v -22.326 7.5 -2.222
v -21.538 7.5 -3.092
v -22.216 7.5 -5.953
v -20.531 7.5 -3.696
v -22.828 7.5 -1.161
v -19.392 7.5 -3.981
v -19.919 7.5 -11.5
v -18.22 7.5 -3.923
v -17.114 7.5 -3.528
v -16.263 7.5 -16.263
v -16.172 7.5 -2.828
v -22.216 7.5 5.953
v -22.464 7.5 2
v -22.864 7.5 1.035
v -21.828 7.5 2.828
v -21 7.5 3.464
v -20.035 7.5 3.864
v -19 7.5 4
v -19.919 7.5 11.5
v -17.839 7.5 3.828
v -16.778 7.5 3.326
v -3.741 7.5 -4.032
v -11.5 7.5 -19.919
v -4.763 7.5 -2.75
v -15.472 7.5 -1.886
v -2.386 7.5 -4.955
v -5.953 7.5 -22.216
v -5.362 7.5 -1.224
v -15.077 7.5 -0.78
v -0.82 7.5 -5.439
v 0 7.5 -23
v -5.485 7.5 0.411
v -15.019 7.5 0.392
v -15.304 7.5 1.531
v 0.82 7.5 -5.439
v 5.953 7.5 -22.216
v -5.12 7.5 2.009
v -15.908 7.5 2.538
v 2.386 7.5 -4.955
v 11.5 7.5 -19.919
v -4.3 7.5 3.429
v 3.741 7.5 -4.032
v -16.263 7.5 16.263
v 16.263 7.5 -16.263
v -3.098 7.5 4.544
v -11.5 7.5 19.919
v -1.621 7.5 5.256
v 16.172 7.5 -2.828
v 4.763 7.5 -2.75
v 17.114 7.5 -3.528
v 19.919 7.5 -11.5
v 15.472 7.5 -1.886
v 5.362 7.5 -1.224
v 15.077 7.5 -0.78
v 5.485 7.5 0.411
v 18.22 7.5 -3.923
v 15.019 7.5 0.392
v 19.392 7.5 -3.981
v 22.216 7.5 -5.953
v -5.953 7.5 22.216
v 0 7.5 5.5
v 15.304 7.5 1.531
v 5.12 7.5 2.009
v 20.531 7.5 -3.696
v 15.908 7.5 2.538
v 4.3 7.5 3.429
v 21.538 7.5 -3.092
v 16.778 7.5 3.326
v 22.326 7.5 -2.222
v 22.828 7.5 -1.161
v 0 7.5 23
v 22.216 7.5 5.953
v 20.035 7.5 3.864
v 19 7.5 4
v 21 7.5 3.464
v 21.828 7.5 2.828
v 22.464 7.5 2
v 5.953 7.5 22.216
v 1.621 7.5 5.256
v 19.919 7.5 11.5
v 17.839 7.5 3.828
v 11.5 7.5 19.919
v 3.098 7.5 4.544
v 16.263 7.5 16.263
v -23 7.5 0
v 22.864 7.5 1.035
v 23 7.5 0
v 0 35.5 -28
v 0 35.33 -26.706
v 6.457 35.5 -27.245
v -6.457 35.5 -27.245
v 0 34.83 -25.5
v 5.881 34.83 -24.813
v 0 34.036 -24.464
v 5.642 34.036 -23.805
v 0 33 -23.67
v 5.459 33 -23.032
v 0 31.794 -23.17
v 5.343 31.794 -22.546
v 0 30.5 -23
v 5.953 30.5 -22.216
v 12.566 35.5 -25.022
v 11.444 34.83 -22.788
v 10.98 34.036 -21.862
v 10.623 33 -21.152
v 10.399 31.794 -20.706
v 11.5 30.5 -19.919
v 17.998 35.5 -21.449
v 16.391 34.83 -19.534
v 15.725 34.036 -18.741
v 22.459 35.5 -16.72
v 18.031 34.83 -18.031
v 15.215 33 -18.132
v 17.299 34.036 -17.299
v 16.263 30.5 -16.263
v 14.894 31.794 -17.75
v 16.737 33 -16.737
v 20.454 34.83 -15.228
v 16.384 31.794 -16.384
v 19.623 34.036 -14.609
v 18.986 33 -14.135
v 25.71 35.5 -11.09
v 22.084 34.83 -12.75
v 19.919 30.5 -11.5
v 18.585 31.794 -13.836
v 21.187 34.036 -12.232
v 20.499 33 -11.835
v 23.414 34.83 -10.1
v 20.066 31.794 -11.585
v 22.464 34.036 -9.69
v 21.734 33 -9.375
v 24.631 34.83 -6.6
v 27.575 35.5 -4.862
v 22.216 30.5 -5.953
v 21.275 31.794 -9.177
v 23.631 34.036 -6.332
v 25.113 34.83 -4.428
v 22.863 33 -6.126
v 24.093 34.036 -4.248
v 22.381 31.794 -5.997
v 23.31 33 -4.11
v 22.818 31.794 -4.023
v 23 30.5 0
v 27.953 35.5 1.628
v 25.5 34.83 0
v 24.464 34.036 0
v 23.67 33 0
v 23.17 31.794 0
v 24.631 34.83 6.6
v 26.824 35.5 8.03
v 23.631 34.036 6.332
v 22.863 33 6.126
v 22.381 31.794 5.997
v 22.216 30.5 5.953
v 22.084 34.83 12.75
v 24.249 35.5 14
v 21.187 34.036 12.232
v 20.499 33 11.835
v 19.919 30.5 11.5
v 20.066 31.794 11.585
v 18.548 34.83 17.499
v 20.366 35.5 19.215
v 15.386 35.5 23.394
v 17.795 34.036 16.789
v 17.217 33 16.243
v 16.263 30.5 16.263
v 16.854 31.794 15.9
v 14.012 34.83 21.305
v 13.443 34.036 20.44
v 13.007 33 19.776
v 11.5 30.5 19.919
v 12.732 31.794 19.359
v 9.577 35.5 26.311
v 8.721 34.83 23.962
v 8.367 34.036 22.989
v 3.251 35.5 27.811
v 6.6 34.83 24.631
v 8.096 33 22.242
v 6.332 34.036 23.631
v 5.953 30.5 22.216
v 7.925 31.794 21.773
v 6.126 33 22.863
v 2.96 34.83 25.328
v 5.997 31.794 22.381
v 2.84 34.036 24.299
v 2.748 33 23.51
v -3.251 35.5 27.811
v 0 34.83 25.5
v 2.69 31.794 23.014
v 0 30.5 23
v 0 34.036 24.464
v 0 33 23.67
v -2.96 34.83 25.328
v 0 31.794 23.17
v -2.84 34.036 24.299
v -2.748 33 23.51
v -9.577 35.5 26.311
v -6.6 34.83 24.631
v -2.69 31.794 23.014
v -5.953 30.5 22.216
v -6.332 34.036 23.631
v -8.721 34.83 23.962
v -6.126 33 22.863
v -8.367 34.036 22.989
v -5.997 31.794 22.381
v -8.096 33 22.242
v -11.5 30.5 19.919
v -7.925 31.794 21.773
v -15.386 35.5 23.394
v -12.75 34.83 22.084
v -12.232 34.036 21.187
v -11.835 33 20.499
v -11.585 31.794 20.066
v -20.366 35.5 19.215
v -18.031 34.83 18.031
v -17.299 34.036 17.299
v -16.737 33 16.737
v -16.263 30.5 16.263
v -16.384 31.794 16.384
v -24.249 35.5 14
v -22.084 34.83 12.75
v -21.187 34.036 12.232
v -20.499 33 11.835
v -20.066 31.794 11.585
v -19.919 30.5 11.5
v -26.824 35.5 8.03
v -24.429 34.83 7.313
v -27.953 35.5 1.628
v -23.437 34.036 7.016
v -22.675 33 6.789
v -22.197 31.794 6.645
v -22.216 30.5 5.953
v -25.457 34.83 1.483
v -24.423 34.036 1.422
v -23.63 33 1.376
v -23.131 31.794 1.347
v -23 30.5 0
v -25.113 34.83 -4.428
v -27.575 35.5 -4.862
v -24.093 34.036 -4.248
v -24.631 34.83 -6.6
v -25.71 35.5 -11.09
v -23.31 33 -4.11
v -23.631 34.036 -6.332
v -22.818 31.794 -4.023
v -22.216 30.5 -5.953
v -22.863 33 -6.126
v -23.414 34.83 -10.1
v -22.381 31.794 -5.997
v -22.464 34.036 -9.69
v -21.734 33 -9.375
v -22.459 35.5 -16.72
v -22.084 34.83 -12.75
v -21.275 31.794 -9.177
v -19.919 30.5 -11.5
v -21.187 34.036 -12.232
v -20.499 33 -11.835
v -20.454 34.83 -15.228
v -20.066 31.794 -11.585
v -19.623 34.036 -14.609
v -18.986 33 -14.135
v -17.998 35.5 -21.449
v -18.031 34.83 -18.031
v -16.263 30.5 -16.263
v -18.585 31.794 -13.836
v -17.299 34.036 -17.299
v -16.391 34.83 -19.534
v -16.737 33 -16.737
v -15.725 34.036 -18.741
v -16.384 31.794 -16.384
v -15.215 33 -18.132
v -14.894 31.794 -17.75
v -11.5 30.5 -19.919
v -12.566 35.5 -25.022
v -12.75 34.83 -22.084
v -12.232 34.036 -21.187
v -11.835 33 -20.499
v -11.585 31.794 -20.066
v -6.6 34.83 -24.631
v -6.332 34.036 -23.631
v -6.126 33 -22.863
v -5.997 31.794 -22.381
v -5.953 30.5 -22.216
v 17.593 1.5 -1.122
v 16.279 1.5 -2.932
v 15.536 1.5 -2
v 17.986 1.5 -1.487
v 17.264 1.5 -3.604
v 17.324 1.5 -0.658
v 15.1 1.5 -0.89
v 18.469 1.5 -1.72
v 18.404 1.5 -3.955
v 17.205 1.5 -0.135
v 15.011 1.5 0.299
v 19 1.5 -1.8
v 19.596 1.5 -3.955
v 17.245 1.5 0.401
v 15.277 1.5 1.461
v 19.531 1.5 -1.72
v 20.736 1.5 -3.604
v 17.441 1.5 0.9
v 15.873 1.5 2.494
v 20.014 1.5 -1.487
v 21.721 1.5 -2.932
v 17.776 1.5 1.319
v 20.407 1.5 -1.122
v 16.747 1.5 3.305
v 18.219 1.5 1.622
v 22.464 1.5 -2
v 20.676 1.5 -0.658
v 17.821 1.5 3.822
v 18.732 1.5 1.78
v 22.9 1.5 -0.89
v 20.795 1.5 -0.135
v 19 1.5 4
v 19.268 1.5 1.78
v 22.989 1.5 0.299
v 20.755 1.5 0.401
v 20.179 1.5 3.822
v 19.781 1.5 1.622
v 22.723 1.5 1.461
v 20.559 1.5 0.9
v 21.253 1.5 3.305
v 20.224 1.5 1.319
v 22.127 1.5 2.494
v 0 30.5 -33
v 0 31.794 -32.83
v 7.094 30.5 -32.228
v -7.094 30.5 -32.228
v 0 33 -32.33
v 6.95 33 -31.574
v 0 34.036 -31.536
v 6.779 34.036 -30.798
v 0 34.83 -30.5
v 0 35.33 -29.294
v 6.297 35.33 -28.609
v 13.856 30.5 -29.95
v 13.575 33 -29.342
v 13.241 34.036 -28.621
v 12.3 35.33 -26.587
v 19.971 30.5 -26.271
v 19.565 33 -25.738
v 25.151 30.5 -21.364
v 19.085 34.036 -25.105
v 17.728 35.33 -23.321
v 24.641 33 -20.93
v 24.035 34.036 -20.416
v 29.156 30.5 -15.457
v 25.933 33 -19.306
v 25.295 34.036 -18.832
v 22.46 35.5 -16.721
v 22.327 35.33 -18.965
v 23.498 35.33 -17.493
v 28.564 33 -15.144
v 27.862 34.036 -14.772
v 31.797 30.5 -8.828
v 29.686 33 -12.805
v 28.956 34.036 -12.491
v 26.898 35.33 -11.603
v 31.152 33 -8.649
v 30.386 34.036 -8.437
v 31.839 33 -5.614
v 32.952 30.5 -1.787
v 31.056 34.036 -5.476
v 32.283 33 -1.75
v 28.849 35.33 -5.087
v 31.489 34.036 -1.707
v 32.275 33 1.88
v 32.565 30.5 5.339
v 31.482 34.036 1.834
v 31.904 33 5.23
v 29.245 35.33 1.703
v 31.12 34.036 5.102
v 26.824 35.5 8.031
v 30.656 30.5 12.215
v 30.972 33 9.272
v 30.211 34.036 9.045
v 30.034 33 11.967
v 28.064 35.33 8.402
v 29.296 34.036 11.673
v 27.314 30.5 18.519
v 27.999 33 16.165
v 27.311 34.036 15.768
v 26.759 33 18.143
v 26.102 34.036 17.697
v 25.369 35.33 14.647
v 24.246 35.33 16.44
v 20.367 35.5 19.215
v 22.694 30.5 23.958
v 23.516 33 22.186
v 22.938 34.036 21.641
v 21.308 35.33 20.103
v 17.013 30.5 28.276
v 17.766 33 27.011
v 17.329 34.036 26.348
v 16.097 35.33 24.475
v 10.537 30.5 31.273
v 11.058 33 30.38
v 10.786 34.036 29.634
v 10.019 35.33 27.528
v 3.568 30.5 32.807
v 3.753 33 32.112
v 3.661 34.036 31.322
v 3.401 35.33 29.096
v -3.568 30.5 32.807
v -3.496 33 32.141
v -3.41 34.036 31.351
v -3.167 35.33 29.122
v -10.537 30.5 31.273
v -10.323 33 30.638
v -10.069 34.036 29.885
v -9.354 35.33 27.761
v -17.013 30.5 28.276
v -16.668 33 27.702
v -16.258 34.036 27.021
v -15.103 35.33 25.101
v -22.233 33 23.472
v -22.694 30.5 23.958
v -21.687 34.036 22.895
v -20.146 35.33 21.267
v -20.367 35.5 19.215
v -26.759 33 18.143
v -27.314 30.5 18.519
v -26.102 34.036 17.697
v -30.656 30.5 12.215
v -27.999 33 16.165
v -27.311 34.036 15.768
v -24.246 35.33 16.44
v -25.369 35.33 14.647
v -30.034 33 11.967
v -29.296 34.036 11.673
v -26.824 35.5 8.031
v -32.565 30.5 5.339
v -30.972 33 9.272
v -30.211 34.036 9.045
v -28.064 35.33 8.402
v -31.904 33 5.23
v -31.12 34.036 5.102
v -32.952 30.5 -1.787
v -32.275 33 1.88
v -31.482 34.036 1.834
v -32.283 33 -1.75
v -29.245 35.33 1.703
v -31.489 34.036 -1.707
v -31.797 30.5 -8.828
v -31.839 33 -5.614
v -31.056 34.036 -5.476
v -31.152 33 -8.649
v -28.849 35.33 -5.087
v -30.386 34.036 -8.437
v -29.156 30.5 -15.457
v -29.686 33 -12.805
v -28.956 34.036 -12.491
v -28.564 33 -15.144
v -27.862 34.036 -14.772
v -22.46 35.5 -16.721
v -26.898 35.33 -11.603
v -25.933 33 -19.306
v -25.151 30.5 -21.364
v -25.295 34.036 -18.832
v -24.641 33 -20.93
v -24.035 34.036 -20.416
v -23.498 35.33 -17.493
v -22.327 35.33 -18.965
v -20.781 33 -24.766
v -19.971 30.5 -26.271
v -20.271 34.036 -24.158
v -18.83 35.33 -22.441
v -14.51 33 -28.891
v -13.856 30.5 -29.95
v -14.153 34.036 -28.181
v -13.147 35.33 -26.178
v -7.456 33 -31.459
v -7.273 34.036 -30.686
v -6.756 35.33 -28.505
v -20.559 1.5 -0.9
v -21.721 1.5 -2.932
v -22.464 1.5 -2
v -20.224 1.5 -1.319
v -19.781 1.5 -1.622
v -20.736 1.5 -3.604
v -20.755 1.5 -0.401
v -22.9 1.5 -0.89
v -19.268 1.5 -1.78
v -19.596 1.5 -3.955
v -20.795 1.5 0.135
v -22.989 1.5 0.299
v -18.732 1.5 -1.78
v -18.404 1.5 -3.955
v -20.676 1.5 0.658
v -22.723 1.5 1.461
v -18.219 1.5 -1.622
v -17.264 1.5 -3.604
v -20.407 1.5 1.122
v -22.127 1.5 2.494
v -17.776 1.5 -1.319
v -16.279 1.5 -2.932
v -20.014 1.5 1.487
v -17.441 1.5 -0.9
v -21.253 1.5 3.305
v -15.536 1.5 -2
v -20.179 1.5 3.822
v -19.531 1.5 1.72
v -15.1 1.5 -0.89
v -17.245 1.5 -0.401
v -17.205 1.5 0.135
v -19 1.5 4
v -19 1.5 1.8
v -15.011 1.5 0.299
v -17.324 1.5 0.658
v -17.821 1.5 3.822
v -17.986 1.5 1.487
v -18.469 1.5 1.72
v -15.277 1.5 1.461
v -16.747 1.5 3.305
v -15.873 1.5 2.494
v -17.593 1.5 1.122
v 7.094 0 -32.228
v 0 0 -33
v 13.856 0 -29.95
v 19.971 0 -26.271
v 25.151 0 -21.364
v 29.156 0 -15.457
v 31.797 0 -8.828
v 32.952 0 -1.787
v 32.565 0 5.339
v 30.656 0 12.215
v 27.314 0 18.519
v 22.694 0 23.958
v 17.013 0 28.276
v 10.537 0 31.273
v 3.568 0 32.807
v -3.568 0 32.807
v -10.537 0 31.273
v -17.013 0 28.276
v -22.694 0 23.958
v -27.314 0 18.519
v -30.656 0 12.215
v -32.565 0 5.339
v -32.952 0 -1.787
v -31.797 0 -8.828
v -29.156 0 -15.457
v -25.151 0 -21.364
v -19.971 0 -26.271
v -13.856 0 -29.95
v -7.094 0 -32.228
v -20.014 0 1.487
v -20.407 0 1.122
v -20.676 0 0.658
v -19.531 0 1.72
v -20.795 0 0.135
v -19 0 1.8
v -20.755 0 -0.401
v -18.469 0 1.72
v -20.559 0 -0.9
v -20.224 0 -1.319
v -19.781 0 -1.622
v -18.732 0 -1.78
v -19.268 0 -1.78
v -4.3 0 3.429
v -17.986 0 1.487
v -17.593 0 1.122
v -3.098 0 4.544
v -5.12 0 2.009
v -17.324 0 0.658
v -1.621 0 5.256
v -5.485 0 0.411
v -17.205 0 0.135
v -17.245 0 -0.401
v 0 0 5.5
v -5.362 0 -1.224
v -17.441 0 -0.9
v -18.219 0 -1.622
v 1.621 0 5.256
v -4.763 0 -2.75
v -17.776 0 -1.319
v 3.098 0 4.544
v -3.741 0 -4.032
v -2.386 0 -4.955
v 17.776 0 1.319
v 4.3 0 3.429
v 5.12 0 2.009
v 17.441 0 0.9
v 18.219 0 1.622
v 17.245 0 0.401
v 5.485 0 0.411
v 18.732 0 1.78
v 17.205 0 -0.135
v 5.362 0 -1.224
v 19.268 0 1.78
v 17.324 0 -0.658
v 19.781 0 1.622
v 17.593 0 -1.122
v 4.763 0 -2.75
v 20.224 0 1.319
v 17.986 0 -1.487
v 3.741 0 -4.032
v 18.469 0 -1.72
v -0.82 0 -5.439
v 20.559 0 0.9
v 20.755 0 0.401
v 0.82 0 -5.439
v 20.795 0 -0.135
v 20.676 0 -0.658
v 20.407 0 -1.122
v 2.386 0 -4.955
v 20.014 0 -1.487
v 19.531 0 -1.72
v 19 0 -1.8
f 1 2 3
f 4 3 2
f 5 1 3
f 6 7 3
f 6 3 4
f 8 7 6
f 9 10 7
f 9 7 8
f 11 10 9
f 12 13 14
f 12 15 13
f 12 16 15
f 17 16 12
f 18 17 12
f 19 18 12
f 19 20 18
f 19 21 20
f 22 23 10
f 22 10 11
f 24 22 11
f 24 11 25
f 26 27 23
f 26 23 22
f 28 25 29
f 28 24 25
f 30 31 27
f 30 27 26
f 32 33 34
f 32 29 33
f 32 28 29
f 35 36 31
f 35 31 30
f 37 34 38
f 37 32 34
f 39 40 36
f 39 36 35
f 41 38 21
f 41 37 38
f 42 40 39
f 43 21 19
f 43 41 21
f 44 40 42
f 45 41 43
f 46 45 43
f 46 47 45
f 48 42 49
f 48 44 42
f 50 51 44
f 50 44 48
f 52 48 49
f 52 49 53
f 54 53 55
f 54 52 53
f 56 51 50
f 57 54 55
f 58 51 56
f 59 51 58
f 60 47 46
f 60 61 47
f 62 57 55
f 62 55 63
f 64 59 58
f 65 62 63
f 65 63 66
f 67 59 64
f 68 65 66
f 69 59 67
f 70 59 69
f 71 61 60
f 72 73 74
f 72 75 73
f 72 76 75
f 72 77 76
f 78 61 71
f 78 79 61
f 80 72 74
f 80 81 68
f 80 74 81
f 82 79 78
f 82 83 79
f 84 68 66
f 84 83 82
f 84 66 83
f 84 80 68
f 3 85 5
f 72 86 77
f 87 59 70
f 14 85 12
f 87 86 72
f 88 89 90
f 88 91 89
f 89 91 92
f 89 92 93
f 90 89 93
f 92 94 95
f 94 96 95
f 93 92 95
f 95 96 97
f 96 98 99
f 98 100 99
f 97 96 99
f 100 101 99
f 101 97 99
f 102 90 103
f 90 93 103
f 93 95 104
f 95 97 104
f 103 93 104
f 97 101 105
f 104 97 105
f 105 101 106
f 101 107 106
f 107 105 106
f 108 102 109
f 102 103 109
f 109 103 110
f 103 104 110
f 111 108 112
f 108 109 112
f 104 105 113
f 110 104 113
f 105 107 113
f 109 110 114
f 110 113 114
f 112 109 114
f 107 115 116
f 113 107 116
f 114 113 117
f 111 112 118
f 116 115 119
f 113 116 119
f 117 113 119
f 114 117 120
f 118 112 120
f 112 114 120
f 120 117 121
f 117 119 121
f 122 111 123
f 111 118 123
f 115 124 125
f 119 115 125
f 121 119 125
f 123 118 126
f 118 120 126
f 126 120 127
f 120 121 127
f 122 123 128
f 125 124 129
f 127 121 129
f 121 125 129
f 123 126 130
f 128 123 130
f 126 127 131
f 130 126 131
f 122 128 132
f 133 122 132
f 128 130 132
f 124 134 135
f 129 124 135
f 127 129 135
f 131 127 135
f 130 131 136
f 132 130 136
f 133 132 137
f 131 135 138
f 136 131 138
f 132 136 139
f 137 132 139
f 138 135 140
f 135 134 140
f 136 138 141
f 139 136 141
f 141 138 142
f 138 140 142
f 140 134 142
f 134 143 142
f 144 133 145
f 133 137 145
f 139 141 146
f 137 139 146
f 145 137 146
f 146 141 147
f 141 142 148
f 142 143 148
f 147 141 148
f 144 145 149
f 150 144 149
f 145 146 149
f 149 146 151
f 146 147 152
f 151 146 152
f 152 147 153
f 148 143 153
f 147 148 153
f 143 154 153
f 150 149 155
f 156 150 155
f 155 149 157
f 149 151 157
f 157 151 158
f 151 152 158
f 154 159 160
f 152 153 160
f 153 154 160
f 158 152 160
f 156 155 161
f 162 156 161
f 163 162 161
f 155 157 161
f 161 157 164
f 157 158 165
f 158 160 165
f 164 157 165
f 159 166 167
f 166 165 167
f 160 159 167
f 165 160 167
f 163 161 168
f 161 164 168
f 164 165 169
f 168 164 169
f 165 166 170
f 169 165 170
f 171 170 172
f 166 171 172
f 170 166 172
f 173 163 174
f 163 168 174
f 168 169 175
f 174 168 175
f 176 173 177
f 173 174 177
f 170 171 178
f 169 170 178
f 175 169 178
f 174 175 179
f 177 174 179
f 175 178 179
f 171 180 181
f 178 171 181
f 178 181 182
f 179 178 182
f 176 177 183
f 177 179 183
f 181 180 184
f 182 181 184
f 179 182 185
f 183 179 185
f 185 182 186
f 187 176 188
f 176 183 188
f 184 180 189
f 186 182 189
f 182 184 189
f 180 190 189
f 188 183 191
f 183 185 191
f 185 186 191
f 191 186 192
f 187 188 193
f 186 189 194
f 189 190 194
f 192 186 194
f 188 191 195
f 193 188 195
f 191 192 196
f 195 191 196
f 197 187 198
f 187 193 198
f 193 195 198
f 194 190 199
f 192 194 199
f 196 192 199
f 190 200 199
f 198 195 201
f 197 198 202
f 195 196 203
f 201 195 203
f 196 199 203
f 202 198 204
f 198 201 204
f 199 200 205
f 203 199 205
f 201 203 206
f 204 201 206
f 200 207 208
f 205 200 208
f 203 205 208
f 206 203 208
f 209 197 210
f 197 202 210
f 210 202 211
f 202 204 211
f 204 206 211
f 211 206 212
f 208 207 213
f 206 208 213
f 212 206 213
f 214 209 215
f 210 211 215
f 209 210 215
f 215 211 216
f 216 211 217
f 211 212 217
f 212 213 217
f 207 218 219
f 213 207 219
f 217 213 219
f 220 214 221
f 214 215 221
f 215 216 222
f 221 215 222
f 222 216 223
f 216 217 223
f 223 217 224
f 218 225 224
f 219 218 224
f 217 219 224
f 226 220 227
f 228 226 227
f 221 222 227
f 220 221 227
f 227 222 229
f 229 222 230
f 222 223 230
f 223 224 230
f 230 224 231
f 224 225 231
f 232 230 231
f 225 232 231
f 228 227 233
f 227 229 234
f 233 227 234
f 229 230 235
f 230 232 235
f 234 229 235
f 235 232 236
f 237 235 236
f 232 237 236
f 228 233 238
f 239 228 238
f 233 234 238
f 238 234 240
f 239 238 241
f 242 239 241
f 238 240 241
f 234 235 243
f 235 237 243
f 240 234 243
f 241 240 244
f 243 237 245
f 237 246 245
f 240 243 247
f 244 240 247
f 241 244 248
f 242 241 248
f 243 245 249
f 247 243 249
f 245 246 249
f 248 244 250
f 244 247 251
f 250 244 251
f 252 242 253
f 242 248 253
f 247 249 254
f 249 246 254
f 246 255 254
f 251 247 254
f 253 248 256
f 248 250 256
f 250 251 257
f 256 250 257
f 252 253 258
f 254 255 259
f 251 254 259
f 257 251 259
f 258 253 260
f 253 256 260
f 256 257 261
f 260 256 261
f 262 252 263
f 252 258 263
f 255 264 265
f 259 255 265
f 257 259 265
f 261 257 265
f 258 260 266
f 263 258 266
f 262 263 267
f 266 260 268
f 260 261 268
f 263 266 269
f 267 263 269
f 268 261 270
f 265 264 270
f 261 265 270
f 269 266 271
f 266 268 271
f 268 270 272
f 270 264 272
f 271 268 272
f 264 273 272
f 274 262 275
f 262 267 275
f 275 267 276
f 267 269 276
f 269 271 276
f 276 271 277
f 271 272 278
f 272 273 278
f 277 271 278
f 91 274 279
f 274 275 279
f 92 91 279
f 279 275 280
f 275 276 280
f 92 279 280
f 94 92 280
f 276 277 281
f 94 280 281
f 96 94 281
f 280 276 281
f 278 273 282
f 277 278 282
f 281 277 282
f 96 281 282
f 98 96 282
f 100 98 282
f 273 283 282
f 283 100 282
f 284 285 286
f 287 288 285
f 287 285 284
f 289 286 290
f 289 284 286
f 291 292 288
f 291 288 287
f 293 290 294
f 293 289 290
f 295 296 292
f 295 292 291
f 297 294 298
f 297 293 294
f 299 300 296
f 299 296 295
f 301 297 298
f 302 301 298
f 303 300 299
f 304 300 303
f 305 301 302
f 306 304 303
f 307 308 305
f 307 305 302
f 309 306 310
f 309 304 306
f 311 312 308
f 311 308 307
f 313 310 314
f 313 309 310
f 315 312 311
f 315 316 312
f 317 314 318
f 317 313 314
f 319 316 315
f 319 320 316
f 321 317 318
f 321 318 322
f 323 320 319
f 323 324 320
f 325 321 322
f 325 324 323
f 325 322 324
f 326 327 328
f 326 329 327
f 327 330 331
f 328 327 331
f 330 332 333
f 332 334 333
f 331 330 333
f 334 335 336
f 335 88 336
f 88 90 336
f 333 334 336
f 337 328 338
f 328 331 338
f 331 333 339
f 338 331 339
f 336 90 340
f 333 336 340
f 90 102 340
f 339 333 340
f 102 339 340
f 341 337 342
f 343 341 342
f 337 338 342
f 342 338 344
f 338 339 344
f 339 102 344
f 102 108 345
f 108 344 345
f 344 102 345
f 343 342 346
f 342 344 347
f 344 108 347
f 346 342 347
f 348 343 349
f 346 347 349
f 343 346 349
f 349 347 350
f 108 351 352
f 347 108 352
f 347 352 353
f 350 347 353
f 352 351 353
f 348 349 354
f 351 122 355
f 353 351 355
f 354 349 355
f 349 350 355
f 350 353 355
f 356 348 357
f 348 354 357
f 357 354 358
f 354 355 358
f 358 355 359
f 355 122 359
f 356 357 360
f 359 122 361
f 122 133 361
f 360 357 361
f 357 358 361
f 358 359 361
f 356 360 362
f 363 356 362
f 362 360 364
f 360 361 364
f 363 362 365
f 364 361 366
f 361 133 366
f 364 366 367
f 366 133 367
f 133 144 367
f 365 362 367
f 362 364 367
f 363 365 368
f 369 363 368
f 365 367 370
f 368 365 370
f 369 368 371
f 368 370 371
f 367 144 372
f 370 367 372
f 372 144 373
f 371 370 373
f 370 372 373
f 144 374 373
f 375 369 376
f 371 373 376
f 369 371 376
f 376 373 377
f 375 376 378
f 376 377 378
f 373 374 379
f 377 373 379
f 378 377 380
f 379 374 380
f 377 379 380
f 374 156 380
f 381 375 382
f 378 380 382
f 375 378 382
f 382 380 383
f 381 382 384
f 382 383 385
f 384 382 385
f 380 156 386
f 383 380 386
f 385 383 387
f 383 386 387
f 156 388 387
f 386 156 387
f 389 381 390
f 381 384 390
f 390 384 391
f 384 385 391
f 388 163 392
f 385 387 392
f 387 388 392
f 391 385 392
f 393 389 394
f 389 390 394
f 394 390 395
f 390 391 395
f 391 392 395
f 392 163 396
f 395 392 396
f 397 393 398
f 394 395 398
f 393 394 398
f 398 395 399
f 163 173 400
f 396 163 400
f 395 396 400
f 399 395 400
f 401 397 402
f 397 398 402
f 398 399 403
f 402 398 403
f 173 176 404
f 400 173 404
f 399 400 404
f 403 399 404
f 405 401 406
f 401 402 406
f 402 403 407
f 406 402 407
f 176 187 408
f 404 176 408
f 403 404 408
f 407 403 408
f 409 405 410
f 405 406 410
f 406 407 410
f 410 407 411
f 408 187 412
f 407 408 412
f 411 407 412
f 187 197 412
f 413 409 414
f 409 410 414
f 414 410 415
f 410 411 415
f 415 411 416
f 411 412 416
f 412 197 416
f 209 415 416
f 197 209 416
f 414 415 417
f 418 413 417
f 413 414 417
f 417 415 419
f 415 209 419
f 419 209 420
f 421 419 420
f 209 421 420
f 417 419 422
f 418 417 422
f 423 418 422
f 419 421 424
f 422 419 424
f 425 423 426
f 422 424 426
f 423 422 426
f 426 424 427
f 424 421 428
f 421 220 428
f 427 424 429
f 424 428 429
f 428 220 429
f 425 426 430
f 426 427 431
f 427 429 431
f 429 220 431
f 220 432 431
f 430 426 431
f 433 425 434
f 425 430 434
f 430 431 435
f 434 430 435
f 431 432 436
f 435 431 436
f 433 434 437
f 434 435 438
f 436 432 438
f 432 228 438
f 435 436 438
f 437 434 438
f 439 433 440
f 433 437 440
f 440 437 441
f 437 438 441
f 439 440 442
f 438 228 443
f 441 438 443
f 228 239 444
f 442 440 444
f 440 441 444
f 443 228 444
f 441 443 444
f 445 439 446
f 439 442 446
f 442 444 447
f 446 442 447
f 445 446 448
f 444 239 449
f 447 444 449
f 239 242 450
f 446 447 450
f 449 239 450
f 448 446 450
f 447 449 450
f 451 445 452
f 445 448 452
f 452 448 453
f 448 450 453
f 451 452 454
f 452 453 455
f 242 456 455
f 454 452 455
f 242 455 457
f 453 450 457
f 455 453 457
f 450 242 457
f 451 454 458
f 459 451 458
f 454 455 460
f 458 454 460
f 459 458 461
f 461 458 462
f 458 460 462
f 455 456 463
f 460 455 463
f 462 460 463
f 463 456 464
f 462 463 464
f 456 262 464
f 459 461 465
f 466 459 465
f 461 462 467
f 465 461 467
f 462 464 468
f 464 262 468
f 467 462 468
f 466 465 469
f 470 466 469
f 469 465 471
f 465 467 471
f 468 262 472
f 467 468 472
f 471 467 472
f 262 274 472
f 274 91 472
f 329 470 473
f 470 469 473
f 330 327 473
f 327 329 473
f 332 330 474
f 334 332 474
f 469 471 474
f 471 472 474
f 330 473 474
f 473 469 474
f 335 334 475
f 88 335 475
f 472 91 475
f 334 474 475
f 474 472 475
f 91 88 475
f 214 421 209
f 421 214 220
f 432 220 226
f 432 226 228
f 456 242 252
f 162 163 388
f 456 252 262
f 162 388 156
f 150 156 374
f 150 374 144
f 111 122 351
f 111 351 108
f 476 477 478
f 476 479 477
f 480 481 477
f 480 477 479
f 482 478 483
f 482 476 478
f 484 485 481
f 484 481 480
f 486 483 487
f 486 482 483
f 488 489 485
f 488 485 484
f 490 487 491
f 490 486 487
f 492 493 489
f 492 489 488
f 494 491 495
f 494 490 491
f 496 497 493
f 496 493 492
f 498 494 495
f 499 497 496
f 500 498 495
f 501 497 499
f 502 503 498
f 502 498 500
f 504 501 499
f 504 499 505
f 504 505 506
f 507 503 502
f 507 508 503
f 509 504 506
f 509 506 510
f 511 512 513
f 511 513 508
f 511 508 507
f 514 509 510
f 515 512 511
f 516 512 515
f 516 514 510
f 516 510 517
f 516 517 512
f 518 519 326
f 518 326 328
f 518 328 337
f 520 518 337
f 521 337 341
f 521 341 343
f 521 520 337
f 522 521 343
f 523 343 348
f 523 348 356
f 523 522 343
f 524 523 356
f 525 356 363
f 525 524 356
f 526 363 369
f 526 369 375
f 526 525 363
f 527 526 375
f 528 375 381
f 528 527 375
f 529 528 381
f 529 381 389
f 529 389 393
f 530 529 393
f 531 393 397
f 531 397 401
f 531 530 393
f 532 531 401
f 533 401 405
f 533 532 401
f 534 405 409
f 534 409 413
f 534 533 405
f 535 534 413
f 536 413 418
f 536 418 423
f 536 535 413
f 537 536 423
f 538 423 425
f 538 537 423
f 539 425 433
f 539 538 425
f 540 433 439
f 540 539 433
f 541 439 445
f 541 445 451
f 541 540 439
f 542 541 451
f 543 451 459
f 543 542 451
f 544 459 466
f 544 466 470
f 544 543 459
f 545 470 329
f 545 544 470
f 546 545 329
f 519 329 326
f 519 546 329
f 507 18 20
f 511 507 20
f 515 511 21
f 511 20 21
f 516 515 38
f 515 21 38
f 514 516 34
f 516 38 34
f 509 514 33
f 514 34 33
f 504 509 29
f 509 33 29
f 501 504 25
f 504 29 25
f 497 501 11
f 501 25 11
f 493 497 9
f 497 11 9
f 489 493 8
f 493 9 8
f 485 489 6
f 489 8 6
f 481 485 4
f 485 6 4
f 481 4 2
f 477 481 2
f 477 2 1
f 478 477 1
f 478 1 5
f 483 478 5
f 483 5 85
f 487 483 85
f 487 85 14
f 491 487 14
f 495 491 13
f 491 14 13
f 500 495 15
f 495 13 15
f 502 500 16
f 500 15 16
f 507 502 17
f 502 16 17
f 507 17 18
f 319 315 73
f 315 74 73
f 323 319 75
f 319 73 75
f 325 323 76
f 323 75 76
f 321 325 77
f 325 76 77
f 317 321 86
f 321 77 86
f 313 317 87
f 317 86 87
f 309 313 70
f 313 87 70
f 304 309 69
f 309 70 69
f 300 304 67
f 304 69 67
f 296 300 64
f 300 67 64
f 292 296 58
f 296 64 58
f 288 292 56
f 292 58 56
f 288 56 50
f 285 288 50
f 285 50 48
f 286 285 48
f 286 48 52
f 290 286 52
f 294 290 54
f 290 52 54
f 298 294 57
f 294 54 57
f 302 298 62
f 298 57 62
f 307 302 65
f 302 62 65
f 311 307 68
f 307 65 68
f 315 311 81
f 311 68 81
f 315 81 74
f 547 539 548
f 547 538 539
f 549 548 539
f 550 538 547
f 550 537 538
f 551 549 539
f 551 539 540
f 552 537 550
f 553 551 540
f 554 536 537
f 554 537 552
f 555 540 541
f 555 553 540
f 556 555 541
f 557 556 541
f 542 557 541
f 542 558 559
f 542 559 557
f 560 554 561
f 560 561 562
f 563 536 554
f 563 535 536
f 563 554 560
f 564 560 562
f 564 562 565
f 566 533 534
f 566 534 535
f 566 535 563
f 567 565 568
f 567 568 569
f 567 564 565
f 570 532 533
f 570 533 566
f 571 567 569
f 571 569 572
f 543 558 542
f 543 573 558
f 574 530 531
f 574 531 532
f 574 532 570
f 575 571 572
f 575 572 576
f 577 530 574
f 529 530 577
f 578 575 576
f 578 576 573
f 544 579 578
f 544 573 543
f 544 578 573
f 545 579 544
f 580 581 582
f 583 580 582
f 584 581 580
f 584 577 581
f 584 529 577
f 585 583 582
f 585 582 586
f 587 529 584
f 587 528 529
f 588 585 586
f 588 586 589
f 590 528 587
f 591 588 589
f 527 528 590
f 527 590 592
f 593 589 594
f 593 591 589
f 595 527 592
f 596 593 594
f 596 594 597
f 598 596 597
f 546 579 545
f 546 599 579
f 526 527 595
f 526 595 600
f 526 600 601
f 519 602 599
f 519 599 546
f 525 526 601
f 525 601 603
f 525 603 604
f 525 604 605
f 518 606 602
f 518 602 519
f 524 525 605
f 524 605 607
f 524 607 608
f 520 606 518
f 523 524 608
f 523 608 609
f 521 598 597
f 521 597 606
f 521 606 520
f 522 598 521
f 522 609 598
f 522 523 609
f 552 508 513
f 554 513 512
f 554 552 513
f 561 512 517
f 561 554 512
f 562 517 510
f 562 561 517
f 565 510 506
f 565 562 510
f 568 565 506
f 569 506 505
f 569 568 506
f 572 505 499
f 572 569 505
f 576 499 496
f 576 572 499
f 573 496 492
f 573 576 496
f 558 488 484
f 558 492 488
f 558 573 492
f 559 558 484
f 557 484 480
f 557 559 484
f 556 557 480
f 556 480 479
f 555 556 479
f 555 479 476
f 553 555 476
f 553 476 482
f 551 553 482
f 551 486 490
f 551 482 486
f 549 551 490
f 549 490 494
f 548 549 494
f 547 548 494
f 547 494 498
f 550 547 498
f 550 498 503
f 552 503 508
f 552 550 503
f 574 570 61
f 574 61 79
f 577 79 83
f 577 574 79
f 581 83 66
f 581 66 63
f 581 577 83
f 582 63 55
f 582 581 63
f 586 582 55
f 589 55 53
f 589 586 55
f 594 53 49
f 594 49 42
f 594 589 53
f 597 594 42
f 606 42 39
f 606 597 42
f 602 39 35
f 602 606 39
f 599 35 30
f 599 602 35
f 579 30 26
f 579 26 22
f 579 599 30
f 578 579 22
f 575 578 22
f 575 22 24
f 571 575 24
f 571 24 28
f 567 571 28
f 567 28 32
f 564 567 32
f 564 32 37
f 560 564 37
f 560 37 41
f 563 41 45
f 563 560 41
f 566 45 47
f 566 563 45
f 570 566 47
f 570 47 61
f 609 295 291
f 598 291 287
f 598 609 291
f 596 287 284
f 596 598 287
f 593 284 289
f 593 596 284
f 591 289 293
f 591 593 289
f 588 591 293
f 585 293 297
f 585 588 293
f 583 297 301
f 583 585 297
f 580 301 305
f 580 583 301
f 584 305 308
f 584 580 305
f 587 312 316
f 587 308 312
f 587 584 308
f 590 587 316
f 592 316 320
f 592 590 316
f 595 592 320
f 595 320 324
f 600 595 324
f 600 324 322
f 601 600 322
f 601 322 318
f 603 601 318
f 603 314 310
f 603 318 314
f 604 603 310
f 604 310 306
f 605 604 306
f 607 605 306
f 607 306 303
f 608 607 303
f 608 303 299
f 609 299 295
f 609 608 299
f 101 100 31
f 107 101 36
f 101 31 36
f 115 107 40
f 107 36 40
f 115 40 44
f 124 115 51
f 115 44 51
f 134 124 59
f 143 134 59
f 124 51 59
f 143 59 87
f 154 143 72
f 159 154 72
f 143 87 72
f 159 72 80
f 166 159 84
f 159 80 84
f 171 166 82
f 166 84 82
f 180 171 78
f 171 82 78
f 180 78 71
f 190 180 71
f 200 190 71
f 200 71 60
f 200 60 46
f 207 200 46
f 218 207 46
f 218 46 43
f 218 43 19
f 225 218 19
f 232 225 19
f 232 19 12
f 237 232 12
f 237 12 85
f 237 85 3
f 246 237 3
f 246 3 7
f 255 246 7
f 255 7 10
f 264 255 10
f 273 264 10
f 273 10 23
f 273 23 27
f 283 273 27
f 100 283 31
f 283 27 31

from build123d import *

# Parameters (mm, degrees)
SKETCH1_R           = 25
SKETCH1_R_2         = 1.8
SKETCH1_R_3         = 5.5
BOSS_EXTRUDE1_DEPTH = 7.5
SKETCH2_R           = 4
CUT_EXTRUDE1_DEPTH  = 6
SKETCH3_R           = 33
SKETCH3_R_2         = 23
BOSS_EXTRUDE2_DEPTH = 35.5
FILLET1_R           = 5


with BuildPart() as part:
    # Sketch1 → Boss-Extrude1 (new body)
    with BuildSketch(Plane(origin=(0, 0, 0), x_dir=(1, 0, 0), z_dir=(0, 1, 0))):
        with Locations(Location((0, 0, 0), (0, 0, 270))):
            Circle(SKETCH1_R)
        with Locations(Location((-19, 0, 0), (0, 0, 270))):
            Circle(SKETCH1_R_2, mode=Mode.SUBTRACT)
        with Locations(Location((19, 0, 0), (0, 0, 90))):
            Circle(SKETCH1_R_2, mode=Mode.SUBTRACT)
        with Locations(Location((0, 0, 0), (0, 0, 270))):
            Circle(SKETCH1_R_3, mode=Mode.SUBTRACT)
    extrude(amount=BOSS_EXTRUDE1_DEPTH)

    # Sketch2 → Cut-Extrude1 (cut)
    with BuildSketch(Plane(origin=(0, 7.5, 0), x_dir=(1, 0, 0), z_dir=(0, 1, 0))):
        with Locations(Location((-19, 0, 0), (0, 0, 270))):
            Circle(SKETCH2_R)
        with Locations(Location((19, 0, 0), (0, 0, 270))):
            Circle(SKETCH2_R)
    extrude(amount=-CUT_EXTRUDE1_DEPTH, mode=Mode.SUBTRACT)

    # Sketch3 → Boss-Extrude2 (add)
    with BuildSketch(Plane.XZ):
        with Locations(Location((0, 0, 0), (0, 0, 270))):
            Circle(SKETCH3_R)
        with Locations(Location((0, 0, 0), (0, 0, 270))):
            Circle(SKETCH3_R_2, mode=Mode.SUBTRACT)
    extrude(amount=-BOSS_EXTRUDE2_DEPTH)

    # Fillet1
    fillet1_edges = [part.edges().sort_by_distance(p)[0] for p in [
        (0, 35.5, 33),
        (0, 35.5, 23),
    ]]
    fillet(fillet1_edges, radius=FILLET1_R - 0.0001)  # a hair under: the kernel refuses the full size


solid = part.part
